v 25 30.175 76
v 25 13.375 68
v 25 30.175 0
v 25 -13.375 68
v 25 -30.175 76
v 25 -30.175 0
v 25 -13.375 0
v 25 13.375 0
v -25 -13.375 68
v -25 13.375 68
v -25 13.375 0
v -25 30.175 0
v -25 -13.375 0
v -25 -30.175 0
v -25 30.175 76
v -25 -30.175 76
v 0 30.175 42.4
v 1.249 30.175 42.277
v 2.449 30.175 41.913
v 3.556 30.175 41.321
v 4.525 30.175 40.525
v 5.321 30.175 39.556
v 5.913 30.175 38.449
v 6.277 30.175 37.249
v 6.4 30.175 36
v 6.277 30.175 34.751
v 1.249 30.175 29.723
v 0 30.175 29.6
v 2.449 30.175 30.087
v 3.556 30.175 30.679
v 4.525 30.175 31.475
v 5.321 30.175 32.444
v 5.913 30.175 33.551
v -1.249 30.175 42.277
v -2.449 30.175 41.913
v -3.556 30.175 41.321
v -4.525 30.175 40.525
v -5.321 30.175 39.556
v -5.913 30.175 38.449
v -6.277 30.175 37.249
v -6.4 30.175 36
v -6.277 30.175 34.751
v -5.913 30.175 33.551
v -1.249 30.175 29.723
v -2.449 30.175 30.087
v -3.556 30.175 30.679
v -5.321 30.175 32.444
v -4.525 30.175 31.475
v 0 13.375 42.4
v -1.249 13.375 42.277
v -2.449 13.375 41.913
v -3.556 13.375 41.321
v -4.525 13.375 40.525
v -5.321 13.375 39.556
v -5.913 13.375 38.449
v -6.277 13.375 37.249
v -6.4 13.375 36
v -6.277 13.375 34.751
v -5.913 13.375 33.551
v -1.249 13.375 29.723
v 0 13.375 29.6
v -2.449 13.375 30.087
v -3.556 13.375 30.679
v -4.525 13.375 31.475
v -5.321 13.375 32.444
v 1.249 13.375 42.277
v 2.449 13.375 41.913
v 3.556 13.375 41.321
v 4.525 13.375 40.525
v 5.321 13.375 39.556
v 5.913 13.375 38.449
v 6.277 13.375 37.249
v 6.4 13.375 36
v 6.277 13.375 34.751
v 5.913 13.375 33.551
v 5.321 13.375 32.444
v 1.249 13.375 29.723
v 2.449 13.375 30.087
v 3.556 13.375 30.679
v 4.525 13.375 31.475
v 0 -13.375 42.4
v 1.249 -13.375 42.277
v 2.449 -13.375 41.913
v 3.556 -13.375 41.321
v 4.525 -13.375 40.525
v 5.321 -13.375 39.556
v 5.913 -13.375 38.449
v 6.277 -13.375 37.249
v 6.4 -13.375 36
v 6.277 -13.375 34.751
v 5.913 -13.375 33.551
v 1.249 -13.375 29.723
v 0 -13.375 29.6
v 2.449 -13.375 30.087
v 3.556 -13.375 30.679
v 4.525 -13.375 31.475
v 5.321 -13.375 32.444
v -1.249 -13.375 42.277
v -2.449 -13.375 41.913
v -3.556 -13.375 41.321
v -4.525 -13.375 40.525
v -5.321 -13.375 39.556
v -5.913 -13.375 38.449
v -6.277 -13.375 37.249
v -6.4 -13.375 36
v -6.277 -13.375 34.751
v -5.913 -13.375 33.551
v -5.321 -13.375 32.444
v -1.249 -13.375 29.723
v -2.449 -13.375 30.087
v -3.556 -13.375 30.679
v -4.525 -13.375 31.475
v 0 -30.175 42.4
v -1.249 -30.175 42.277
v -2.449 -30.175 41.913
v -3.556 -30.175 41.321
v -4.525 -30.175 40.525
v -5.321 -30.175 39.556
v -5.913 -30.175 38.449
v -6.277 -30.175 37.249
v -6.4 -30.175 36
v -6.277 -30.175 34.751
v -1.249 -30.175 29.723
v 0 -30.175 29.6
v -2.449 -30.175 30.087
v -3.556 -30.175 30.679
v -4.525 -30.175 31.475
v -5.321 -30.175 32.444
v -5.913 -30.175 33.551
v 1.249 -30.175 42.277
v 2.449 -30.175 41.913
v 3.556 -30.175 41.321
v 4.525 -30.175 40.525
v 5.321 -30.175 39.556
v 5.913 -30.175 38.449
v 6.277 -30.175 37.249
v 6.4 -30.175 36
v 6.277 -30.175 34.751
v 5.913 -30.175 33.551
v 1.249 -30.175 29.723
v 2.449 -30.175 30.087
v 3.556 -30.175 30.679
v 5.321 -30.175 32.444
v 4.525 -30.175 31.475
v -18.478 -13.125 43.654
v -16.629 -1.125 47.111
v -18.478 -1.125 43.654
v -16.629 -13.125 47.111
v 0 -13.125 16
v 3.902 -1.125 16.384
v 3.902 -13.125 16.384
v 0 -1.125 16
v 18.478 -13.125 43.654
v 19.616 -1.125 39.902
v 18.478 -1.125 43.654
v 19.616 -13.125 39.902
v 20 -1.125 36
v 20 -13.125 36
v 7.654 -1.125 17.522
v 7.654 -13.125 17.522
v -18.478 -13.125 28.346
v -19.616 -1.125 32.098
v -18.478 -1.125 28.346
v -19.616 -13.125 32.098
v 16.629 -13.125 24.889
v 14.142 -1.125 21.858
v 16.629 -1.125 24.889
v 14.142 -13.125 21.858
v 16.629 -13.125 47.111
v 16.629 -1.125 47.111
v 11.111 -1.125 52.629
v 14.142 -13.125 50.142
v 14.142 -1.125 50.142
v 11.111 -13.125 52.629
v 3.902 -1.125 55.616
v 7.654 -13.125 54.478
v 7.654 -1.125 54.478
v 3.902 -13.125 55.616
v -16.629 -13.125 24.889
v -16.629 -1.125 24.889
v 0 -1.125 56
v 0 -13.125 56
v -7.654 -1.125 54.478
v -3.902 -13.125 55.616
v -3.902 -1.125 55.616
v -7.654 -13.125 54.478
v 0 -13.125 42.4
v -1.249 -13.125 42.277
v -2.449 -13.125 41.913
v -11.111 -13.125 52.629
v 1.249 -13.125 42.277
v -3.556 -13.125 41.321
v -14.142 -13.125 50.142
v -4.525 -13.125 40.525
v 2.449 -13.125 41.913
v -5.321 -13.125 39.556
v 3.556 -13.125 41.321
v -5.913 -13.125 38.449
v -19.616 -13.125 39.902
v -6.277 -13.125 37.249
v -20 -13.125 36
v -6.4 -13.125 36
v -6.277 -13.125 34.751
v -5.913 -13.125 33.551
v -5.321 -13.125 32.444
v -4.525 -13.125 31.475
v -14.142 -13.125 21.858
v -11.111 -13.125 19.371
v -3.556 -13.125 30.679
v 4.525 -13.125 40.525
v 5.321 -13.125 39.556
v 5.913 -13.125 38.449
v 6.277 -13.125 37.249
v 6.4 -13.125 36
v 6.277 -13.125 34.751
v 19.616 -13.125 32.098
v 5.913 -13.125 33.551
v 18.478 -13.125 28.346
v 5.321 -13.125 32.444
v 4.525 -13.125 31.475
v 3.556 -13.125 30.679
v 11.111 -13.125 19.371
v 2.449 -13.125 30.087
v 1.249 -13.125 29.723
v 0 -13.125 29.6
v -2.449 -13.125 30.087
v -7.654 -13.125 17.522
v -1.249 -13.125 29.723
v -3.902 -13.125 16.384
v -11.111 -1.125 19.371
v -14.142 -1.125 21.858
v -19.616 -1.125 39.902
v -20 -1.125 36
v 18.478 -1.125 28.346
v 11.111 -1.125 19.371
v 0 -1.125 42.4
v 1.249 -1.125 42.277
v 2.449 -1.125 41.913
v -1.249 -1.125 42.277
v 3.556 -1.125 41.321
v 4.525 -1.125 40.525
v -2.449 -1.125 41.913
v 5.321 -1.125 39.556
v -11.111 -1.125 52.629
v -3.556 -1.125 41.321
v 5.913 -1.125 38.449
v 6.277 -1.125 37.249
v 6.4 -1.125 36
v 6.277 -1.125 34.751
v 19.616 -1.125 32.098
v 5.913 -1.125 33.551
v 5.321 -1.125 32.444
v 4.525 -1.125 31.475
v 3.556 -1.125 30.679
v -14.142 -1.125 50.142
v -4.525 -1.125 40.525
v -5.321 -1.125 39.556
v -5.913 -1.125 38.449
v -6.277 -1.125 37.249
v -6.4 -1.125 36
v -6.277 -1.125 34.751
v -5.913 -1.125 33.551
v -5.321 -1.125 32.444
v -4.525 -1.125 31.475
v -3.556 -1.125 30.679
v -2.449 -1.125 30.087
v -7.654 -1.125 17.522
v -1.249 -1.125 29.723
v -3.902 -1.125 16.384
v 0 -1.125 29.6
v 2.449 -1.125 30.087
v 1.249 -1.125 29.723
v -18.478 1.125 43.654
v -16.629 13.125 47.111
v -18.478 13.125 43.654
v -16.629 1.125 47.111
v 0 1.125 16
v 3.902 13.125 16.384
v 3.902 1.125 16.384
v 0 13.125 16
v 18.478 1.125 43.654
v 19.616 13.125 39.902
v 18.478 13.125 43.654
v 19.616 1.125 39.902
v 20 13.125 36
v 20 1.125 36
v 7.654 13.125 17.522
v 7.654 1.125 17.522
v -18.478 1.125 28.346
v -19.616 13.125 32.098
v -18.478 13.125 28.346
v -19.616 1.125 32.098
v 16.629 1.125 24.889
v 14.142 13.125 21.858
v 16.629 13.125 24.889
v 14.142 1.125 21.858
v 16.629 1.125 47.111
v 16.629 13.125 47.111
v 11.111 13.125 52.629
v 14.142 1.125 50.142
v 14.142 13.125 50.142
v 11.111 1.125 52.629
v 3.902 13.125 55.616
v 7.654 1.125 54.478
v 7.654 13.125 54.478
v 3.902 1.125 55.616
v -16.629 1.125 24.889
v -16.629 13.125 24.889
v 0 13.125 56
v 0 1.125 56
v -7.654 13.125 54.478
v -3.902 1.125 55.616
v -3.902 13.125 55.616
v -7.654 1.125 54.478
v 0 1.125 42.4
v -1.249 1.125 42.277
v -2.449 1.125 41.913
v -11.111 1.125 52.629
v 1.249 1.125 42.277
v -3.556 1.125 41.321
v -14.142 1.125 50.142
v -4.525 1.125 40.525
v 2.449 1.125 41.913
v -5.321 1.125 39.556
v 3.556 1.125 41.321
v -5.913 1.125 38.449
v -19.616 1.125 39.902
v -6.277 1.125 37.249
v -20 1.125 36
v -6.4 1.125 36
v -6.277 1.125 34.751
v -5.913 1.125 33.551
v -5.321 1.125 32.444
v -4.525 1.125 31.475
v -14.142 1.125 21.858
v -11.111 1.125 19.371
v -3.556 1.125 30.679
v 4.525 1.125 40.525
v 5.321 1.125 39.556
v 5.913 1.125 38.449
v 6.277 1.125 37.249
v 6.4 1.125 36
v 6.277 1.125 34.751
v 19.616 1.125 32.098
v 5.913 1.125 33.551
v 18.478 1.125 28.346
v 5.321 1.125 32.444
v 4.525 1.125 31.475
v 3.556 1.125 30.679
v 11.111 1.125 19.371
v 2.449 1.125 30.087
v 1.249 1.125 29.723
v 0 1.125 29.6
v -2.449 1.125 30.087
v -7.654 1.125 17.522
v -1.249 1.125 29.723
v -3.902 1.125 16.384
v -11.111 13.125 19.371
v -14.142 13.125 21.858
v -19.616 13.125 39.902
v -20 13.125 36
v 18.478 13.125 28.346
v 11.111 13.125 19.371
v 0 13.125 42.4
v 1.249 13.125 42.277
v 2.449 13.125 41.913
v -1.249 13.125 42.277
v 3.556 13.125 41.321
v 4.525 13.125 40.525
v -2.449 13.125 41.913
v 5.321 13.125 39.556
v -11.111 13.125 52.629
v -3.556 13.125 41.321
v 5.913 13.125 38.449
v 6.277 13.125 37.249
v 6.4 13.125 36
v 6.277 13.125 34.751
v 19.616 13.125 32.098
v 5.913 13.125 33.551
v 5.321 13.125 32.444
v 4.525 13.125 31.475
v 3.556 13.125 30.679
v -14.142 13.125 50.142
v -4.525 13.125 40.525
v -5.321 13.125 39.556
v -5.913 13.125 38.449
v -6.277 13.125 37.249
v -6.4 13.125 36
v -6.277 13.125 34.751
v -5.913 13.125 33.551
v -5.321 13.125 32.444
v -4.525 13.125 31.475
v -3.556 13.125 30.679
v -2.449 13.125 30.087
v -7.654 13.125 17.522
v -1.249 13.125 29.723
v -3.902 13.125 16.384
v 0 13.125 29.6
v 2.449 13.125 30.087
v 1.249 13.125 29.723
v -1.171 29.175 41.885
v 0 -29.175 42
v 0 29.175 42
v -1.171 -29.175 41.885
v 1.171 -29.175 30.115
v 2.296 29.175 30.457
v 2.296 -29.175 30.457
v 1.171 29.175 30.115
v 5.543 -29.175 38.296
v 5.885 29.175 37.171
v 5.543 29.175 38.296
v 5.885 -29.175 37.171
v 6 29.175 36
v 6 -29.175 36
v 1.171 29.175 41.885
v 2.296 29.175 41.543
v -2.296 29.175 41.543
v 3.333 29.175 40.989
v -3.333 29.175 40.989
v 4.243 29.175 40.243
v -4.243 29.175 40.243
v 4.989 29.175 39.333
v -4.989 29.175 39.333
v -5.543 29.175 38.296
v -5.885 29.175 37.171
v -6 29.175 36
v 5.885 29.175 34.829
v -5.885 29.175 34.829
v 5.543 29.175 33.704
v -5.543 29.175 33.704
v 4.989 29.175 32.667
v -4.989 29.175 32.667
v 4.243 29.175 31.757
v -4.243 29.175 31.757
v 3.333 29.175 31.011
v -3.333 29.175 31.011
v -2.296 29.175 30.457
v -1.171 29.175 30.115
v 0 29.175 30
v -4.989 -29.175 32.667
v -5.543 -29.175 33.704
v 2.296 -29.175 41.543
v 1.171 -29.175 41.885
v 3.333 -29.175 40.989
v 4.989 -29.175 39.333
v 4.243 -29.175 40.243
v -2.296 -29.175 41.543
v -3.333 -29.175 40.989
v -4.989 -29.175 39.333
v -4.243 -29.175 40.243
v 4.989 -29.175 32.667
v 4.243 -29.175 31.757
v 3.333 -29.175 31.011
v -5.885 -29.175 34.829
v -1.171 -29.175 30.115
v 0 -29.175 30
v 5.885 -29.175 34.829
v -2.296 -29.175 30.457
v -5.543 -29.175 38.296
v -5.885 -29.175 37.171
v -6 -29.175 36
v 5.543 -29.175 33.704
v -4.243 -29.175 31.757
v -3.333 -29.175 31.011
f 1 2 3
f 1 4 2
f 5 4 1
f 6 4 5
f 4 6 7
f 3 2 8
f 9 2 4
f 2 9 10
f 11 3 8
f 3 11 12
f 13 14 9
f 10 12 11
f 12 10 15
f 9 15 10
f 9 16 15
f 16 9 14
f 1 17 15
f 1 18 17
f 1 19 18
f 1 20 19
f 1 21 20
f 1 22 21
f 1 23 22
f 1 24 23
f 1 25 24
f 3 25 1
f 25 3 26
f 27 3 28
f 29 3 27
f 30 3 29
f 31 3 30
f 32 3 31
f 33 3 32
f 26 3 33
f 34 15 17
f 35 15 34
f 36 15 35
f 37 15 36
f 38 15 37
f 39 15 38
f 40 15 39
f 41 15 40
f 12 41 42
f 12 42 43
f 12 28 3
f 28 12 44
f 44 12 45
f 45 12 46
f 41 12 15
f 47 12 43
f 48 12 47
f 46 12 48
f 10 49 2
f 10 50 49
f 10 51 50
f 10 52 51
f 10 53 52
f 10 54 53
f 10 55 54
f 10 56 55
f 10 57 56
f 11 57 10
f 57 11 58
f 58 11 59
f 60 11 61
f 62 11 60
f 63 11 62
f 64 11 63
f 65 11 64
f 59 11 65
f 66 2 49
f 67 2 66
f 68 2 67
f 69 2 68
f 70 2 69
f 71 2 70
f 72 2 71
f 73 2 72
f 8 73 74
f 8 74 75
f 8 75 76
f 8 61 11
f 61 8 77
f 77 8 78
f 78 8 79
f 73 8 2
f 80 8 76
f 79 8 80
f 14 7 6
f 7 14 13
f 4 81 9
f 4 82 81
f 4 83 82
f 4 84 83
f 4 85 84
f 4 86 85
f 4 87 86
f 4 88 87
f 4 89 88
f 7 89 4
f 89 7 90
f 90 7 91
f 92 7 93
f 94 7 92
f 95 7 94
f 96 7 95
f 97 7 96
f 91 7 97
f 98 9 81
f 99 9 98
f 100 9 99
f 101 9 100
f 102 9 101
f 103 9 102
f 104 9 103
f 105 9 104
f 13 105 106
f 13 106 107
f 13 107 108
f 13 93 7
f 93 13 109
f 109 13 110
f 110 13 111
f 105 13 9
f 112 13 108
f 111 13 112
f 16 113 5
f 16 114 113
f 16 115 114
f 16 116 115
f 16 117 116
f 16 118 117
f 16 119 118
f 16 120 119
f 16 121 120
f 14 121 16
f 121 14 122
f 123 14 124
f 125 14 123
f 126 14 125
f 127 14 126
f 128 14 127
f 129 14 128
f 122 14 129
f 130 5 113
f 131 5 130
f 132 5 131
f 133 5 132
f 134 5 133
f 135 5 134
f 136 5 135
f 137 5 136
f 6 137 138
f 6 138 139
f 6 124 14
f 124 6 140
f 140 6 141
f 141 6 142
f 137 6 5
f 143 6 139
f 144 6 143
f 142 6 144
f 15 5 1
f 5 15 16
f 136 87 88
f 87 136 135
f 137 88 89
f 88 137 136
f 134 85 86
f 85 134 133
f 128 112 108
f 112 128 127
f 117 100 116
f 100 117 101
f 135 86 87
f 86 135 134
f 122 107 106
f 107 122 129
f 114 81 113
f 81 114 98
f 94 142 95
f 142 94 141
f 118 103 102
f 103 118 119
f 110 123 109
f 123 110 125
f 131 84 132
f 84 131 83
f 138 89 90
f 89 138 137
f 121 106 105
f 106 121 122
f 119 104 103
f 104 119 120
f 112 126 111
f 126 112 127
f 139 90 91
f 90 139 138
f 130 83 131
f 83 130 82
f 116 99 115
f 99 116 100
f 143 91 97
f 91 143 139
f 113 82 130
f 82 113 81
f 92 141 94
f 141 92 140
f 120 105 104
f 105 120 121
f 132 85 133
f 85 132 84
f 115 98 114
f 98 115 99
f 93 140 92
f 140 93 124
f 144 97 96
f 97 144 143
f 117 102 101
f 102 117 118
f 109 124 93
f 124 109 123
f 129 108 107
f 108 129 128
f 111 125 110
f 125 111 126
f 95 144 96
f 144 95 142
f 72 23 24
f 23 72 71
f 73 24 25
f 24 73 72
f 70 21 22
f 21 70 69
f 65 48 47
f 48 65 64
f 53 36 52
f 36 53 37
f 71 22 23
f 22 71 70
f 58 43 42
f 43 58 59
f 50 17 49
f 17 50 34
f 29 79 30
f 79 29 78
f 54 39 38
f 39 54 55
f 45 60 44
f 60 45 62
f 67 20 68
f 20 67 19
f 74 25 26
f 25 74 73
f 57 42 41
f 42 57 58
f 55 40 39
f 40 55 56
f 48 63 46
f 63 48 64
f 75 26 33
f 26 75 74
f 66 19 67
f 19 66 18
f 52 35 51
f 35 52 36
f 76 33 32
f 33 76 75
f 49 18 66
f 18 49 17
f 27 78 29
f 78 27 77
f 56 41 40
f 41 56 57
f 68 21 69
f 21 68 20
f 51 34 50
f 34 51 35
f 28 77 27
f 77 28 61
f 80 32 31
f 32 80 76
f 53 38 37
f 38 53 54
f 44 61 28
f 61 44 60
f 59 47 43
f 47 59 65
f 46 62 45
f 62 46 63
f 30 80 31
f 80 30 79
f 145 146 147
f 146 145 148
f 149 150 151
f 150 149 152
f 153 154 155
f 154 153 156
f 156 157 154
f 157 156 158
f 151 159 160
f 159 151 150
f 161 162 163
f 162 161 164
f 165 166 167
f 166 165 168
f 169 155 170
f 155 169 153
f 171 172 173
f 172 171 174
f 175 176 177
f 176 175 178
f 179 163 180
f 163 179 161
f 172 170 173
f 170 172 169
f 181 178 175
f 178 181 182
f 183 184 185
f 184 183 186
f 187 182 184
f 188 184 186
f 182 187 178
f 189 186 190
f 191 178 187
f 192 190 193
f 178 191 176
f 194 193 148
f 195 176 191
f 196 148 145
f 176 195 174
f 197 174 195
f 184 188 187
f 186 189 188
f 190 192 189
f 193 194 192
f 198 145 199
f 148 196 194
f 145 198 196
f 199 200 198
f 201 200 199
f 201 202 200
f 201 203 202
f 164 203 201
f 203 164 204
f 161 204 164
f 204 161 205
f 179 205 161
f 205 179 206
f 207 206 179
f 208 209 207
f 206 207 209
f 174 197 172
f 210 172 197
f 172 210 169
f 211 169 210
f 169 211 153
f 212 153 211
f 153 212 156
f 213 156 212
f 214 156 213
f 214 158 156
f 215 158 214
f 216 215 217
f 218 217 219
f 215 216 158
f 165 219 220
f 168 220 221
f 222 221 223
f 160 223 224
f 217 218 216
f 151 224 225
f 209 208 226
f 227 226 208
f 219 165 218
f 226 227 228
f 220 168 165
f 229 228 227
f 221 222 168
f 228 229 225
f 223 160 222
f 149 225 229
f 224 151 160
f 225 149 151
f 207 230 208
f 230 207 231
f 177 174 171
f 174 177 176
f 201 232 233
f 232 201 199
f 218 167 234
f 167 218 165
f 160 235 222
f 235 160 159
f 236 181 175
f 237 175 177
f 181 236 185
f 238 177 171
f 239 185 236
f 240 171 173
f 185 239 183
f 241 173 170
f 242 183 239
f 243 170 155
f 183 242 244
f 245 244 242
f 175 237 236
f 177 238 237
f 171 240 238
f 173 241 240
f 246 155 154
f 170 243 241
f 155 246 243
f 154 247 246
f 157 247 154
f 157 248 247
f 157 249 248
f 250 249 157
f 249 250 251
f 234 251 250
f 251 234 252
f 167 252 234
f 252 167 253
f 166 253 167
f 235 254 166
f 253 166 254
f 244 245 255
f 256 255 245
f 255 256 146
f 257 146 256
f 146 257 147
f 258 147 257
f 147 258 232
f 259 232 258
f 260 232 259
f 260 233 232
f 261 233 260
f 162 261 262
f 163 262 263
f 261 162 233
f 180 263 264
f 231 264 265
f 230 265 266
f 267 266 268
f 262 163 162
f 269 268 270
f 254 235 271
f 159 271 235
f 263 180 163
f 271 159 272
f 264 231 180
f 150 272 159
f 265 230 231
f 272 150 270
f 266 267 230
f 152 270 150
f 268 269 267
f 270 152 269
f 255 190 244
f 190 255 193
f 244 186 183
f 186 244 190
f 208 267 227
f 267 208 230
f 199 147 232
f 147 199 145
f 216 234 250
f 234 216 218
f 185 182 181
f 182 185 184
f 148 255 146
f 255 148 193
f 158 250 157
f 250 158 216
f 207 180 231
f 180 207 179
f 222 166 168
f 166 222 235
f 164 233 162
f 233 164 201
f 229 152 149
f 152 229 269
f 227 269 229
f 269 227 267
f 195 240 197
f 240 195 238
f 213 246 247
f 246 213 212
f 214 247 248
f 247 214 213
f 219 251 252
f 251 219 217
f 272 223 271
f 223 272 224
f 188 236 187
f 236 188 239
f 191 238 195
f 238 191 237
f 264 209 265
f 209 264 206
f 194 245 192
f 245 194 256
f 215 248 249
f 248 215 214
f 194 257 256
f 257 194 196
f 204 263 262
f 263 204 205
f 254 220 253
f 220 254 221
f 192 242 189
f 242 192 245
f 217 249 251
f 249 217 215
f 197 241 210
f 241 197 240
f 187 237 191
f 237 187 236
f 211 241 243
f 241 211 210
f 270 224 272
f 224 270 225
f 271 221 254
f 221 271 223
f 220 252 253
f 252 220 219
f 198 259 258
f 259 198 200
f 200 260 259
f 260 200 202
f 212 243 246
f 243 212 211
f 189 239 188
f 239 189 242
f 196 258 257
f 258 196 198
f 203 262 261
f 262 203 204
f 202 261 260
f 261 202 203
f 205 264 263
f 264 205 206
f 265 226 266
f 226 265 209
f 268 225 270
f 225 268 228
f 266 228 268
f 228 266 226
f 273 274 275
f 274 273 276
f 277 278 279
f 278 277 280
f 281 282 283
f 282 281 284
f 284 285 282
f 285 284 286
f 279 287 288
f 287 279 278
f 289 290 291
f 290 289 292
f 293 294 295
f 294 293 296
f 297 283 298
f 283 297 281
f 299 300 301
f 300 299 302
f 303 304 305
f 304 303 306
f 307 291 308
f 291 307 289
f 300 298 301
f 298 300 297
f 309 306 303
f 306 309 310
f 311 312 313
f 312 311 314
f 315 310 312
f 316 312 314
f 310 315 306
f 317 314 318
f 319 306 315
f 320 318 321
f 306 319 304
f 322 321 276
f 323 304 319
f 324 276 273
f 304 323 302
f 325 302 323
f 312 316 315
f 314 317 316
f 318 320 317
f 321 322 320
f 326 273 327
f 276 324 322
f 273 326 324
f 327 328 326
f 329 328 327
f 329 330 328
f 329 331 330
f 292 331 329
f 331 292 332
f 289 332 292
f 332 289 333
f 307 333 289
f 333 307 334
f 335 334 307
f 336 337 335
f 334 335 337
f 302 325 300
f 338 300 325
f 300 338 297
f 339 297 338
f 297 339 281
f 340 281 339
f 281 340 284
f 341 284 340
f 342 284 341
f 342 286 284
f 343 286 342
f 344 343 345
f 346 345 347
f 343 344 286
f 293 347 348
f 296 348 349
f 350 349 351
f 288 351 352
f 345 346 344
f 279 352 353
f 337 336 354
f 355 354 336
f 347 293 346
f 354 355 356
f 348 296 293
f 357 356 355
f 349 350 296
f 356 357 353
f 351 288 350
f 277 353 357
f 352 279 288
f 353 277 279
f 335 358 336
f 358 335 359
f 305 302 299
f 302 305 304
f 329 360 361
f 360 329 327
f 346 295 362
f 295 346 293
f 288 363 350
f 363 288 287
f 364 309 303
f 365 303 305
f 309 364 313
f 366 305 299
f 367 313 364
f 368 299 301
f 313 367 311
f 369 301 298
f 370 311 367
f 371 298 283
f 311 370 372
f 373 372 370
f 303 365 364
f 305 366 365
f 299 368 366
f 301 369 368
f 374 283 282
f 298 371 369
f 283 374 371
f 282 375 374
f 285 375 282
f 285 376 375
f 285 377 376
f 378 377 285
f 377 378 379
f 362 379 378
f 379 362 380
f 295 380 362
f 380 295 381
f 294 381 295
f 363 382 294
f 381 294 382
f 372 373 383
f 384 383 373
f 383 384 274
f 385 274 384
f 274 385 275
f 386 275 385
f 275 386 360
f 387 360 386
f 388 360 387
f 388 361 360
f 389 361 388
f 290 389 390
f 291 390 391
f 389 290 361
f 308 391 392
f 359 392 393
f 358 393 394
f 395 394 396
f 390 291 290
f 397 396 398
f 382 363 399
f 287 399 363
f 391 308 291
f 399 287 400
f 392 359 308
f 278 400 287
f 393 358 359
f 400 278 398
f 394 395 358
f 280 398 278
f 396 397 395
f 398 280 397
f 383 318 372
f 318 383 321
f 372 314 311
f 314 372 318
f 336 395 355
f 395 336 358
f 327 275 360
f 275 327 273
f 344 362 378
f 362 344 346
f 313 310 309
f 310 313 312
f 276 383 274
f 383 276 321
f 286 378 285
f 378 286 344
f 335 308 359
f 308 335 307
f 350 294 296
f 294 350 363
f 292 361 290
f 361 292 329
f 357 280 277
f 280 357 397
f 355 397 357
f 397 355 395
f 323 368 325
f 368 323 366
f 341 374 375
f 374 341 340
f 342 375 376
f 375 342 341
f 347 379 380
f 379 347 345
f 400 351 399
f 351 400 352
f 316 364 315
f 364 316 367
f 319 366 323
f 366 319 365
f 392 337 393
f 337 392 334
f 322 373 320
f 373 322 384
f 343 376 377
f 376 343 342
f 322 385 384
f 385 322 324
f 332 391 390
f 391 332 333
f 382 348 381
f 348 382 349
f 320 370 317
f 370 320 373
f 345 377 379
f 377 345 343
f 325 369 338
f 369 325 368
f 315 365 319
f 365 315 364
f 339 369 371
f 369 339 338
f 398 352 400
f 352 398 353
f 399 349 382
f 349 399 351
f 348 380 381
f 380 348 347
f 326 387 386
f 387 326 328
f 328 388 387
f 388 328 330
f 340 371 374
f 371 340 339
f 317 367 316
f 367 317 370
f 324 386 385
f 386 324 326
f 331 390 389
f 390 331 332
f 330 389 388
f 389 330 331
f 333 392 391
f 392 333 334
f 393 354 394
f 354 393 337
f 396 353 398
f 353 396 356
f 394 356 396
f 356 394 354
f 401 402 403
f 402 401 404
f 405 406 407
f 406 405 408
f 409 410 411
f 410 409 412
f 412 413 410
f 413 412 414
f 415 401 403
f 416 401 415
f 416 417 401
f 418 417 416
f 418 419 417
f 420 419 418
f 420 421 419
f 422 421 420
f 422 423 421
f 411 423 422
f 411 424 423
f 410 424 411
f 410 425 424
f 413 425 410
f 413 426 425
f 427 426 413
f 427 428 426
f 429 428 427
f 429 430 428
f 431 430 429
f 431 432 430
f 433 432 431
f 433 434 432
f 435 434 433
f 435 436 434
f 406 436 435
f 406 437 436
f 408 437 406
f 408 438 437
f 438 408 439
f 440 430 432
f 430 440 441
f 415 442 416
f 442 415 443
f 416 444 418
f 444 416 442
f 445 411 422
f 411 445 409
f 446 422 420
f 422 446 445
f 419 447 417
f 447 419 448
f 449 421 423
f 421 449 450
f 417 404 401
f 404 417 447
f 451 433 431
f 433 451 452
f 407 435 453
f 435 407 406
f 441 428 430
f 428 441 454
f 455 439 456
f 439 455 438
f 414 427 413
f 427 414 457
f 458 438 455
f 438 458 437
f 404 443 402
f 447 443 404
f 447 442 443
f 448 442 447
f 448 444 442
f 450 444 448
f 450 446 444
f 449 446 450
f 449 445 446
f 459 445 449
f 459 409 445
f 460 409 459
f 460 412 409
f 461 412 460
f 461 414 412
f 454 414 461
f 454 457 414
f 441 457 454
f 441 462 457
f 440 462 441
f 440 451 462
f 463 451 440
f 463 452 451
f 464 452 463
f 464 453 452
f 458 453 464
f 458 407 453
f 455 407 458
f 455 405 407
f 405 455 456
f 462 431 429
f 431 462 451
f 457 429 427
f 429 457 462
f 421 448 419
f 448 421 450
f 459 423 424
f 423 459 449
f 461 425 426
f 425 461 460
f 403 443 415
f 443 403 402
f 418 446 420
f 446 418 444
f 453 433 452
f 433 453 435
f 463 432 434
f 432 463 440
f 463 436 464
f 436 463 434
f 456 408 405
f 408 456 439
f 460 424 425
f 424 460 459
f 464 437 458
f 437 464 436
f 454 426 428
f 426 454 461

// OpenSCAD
$fn = 32;

// ------------------------------------------------------------------------
// Trolley wheel set: wheels d40, fork 68 mm tall
// Every part is its own module, assembly() places every instance.
// ------------------------------------------------------------------------

// --- part 1 ---
module trolley_fork() {
  difference() {
    union() {
      translate([-25, 13.375, 0]) cube([50, 16.8, 68]);
      translate([-25, -30.175, 0]) cube([50, 16.8, 68]);
      translate([-25, -30.175, 68]) cube([50, 60.35, 8]);
    }
    translate([0, -21.775, 36]) rotate([90, 0, 0]) cylinder(h = 18.8, d = 12.8, center = true);
    translate([0, 21.775, 36]) rotate([90, 0, 0]) cylinder(h = 18.8, d = 12.8, center = true);
  }
}

// --- part 2 ---
module trolley_wheel() {
  difference() {
      translate([0, 0, 0]) cylinder(h = 12, d = 40);
      translate([0, 0, -1]) cylinder(h = 14, d = 12.8);
    }
}

// --- part 3 ---
module trolley_axle() {
  translate([0, 0, -29.175]) cylinder(h = 58.35, d = 12);
}

// --- assembly ---
module assembly() {
  color([0.80, 0.24, 0.20]) translate([0, 0, 0]) rotate([0, 0, 0]) trolley_fork();
  color([0.20, 0.45, 0.75]) translate([0, -1.125, 36]) rotate([90, 0, 0]) trolley_wheel();
  color([0.25, 0.62, 0.32]) translate([0, 13.125, 36]) rotate([90, 0, 0]) trolley_wheel();
  color([0.92, 0.70, 0.18]) translate([0, 0, 36]) rotate([90, 0, 0]) trolley_axle();
}

assembly();
